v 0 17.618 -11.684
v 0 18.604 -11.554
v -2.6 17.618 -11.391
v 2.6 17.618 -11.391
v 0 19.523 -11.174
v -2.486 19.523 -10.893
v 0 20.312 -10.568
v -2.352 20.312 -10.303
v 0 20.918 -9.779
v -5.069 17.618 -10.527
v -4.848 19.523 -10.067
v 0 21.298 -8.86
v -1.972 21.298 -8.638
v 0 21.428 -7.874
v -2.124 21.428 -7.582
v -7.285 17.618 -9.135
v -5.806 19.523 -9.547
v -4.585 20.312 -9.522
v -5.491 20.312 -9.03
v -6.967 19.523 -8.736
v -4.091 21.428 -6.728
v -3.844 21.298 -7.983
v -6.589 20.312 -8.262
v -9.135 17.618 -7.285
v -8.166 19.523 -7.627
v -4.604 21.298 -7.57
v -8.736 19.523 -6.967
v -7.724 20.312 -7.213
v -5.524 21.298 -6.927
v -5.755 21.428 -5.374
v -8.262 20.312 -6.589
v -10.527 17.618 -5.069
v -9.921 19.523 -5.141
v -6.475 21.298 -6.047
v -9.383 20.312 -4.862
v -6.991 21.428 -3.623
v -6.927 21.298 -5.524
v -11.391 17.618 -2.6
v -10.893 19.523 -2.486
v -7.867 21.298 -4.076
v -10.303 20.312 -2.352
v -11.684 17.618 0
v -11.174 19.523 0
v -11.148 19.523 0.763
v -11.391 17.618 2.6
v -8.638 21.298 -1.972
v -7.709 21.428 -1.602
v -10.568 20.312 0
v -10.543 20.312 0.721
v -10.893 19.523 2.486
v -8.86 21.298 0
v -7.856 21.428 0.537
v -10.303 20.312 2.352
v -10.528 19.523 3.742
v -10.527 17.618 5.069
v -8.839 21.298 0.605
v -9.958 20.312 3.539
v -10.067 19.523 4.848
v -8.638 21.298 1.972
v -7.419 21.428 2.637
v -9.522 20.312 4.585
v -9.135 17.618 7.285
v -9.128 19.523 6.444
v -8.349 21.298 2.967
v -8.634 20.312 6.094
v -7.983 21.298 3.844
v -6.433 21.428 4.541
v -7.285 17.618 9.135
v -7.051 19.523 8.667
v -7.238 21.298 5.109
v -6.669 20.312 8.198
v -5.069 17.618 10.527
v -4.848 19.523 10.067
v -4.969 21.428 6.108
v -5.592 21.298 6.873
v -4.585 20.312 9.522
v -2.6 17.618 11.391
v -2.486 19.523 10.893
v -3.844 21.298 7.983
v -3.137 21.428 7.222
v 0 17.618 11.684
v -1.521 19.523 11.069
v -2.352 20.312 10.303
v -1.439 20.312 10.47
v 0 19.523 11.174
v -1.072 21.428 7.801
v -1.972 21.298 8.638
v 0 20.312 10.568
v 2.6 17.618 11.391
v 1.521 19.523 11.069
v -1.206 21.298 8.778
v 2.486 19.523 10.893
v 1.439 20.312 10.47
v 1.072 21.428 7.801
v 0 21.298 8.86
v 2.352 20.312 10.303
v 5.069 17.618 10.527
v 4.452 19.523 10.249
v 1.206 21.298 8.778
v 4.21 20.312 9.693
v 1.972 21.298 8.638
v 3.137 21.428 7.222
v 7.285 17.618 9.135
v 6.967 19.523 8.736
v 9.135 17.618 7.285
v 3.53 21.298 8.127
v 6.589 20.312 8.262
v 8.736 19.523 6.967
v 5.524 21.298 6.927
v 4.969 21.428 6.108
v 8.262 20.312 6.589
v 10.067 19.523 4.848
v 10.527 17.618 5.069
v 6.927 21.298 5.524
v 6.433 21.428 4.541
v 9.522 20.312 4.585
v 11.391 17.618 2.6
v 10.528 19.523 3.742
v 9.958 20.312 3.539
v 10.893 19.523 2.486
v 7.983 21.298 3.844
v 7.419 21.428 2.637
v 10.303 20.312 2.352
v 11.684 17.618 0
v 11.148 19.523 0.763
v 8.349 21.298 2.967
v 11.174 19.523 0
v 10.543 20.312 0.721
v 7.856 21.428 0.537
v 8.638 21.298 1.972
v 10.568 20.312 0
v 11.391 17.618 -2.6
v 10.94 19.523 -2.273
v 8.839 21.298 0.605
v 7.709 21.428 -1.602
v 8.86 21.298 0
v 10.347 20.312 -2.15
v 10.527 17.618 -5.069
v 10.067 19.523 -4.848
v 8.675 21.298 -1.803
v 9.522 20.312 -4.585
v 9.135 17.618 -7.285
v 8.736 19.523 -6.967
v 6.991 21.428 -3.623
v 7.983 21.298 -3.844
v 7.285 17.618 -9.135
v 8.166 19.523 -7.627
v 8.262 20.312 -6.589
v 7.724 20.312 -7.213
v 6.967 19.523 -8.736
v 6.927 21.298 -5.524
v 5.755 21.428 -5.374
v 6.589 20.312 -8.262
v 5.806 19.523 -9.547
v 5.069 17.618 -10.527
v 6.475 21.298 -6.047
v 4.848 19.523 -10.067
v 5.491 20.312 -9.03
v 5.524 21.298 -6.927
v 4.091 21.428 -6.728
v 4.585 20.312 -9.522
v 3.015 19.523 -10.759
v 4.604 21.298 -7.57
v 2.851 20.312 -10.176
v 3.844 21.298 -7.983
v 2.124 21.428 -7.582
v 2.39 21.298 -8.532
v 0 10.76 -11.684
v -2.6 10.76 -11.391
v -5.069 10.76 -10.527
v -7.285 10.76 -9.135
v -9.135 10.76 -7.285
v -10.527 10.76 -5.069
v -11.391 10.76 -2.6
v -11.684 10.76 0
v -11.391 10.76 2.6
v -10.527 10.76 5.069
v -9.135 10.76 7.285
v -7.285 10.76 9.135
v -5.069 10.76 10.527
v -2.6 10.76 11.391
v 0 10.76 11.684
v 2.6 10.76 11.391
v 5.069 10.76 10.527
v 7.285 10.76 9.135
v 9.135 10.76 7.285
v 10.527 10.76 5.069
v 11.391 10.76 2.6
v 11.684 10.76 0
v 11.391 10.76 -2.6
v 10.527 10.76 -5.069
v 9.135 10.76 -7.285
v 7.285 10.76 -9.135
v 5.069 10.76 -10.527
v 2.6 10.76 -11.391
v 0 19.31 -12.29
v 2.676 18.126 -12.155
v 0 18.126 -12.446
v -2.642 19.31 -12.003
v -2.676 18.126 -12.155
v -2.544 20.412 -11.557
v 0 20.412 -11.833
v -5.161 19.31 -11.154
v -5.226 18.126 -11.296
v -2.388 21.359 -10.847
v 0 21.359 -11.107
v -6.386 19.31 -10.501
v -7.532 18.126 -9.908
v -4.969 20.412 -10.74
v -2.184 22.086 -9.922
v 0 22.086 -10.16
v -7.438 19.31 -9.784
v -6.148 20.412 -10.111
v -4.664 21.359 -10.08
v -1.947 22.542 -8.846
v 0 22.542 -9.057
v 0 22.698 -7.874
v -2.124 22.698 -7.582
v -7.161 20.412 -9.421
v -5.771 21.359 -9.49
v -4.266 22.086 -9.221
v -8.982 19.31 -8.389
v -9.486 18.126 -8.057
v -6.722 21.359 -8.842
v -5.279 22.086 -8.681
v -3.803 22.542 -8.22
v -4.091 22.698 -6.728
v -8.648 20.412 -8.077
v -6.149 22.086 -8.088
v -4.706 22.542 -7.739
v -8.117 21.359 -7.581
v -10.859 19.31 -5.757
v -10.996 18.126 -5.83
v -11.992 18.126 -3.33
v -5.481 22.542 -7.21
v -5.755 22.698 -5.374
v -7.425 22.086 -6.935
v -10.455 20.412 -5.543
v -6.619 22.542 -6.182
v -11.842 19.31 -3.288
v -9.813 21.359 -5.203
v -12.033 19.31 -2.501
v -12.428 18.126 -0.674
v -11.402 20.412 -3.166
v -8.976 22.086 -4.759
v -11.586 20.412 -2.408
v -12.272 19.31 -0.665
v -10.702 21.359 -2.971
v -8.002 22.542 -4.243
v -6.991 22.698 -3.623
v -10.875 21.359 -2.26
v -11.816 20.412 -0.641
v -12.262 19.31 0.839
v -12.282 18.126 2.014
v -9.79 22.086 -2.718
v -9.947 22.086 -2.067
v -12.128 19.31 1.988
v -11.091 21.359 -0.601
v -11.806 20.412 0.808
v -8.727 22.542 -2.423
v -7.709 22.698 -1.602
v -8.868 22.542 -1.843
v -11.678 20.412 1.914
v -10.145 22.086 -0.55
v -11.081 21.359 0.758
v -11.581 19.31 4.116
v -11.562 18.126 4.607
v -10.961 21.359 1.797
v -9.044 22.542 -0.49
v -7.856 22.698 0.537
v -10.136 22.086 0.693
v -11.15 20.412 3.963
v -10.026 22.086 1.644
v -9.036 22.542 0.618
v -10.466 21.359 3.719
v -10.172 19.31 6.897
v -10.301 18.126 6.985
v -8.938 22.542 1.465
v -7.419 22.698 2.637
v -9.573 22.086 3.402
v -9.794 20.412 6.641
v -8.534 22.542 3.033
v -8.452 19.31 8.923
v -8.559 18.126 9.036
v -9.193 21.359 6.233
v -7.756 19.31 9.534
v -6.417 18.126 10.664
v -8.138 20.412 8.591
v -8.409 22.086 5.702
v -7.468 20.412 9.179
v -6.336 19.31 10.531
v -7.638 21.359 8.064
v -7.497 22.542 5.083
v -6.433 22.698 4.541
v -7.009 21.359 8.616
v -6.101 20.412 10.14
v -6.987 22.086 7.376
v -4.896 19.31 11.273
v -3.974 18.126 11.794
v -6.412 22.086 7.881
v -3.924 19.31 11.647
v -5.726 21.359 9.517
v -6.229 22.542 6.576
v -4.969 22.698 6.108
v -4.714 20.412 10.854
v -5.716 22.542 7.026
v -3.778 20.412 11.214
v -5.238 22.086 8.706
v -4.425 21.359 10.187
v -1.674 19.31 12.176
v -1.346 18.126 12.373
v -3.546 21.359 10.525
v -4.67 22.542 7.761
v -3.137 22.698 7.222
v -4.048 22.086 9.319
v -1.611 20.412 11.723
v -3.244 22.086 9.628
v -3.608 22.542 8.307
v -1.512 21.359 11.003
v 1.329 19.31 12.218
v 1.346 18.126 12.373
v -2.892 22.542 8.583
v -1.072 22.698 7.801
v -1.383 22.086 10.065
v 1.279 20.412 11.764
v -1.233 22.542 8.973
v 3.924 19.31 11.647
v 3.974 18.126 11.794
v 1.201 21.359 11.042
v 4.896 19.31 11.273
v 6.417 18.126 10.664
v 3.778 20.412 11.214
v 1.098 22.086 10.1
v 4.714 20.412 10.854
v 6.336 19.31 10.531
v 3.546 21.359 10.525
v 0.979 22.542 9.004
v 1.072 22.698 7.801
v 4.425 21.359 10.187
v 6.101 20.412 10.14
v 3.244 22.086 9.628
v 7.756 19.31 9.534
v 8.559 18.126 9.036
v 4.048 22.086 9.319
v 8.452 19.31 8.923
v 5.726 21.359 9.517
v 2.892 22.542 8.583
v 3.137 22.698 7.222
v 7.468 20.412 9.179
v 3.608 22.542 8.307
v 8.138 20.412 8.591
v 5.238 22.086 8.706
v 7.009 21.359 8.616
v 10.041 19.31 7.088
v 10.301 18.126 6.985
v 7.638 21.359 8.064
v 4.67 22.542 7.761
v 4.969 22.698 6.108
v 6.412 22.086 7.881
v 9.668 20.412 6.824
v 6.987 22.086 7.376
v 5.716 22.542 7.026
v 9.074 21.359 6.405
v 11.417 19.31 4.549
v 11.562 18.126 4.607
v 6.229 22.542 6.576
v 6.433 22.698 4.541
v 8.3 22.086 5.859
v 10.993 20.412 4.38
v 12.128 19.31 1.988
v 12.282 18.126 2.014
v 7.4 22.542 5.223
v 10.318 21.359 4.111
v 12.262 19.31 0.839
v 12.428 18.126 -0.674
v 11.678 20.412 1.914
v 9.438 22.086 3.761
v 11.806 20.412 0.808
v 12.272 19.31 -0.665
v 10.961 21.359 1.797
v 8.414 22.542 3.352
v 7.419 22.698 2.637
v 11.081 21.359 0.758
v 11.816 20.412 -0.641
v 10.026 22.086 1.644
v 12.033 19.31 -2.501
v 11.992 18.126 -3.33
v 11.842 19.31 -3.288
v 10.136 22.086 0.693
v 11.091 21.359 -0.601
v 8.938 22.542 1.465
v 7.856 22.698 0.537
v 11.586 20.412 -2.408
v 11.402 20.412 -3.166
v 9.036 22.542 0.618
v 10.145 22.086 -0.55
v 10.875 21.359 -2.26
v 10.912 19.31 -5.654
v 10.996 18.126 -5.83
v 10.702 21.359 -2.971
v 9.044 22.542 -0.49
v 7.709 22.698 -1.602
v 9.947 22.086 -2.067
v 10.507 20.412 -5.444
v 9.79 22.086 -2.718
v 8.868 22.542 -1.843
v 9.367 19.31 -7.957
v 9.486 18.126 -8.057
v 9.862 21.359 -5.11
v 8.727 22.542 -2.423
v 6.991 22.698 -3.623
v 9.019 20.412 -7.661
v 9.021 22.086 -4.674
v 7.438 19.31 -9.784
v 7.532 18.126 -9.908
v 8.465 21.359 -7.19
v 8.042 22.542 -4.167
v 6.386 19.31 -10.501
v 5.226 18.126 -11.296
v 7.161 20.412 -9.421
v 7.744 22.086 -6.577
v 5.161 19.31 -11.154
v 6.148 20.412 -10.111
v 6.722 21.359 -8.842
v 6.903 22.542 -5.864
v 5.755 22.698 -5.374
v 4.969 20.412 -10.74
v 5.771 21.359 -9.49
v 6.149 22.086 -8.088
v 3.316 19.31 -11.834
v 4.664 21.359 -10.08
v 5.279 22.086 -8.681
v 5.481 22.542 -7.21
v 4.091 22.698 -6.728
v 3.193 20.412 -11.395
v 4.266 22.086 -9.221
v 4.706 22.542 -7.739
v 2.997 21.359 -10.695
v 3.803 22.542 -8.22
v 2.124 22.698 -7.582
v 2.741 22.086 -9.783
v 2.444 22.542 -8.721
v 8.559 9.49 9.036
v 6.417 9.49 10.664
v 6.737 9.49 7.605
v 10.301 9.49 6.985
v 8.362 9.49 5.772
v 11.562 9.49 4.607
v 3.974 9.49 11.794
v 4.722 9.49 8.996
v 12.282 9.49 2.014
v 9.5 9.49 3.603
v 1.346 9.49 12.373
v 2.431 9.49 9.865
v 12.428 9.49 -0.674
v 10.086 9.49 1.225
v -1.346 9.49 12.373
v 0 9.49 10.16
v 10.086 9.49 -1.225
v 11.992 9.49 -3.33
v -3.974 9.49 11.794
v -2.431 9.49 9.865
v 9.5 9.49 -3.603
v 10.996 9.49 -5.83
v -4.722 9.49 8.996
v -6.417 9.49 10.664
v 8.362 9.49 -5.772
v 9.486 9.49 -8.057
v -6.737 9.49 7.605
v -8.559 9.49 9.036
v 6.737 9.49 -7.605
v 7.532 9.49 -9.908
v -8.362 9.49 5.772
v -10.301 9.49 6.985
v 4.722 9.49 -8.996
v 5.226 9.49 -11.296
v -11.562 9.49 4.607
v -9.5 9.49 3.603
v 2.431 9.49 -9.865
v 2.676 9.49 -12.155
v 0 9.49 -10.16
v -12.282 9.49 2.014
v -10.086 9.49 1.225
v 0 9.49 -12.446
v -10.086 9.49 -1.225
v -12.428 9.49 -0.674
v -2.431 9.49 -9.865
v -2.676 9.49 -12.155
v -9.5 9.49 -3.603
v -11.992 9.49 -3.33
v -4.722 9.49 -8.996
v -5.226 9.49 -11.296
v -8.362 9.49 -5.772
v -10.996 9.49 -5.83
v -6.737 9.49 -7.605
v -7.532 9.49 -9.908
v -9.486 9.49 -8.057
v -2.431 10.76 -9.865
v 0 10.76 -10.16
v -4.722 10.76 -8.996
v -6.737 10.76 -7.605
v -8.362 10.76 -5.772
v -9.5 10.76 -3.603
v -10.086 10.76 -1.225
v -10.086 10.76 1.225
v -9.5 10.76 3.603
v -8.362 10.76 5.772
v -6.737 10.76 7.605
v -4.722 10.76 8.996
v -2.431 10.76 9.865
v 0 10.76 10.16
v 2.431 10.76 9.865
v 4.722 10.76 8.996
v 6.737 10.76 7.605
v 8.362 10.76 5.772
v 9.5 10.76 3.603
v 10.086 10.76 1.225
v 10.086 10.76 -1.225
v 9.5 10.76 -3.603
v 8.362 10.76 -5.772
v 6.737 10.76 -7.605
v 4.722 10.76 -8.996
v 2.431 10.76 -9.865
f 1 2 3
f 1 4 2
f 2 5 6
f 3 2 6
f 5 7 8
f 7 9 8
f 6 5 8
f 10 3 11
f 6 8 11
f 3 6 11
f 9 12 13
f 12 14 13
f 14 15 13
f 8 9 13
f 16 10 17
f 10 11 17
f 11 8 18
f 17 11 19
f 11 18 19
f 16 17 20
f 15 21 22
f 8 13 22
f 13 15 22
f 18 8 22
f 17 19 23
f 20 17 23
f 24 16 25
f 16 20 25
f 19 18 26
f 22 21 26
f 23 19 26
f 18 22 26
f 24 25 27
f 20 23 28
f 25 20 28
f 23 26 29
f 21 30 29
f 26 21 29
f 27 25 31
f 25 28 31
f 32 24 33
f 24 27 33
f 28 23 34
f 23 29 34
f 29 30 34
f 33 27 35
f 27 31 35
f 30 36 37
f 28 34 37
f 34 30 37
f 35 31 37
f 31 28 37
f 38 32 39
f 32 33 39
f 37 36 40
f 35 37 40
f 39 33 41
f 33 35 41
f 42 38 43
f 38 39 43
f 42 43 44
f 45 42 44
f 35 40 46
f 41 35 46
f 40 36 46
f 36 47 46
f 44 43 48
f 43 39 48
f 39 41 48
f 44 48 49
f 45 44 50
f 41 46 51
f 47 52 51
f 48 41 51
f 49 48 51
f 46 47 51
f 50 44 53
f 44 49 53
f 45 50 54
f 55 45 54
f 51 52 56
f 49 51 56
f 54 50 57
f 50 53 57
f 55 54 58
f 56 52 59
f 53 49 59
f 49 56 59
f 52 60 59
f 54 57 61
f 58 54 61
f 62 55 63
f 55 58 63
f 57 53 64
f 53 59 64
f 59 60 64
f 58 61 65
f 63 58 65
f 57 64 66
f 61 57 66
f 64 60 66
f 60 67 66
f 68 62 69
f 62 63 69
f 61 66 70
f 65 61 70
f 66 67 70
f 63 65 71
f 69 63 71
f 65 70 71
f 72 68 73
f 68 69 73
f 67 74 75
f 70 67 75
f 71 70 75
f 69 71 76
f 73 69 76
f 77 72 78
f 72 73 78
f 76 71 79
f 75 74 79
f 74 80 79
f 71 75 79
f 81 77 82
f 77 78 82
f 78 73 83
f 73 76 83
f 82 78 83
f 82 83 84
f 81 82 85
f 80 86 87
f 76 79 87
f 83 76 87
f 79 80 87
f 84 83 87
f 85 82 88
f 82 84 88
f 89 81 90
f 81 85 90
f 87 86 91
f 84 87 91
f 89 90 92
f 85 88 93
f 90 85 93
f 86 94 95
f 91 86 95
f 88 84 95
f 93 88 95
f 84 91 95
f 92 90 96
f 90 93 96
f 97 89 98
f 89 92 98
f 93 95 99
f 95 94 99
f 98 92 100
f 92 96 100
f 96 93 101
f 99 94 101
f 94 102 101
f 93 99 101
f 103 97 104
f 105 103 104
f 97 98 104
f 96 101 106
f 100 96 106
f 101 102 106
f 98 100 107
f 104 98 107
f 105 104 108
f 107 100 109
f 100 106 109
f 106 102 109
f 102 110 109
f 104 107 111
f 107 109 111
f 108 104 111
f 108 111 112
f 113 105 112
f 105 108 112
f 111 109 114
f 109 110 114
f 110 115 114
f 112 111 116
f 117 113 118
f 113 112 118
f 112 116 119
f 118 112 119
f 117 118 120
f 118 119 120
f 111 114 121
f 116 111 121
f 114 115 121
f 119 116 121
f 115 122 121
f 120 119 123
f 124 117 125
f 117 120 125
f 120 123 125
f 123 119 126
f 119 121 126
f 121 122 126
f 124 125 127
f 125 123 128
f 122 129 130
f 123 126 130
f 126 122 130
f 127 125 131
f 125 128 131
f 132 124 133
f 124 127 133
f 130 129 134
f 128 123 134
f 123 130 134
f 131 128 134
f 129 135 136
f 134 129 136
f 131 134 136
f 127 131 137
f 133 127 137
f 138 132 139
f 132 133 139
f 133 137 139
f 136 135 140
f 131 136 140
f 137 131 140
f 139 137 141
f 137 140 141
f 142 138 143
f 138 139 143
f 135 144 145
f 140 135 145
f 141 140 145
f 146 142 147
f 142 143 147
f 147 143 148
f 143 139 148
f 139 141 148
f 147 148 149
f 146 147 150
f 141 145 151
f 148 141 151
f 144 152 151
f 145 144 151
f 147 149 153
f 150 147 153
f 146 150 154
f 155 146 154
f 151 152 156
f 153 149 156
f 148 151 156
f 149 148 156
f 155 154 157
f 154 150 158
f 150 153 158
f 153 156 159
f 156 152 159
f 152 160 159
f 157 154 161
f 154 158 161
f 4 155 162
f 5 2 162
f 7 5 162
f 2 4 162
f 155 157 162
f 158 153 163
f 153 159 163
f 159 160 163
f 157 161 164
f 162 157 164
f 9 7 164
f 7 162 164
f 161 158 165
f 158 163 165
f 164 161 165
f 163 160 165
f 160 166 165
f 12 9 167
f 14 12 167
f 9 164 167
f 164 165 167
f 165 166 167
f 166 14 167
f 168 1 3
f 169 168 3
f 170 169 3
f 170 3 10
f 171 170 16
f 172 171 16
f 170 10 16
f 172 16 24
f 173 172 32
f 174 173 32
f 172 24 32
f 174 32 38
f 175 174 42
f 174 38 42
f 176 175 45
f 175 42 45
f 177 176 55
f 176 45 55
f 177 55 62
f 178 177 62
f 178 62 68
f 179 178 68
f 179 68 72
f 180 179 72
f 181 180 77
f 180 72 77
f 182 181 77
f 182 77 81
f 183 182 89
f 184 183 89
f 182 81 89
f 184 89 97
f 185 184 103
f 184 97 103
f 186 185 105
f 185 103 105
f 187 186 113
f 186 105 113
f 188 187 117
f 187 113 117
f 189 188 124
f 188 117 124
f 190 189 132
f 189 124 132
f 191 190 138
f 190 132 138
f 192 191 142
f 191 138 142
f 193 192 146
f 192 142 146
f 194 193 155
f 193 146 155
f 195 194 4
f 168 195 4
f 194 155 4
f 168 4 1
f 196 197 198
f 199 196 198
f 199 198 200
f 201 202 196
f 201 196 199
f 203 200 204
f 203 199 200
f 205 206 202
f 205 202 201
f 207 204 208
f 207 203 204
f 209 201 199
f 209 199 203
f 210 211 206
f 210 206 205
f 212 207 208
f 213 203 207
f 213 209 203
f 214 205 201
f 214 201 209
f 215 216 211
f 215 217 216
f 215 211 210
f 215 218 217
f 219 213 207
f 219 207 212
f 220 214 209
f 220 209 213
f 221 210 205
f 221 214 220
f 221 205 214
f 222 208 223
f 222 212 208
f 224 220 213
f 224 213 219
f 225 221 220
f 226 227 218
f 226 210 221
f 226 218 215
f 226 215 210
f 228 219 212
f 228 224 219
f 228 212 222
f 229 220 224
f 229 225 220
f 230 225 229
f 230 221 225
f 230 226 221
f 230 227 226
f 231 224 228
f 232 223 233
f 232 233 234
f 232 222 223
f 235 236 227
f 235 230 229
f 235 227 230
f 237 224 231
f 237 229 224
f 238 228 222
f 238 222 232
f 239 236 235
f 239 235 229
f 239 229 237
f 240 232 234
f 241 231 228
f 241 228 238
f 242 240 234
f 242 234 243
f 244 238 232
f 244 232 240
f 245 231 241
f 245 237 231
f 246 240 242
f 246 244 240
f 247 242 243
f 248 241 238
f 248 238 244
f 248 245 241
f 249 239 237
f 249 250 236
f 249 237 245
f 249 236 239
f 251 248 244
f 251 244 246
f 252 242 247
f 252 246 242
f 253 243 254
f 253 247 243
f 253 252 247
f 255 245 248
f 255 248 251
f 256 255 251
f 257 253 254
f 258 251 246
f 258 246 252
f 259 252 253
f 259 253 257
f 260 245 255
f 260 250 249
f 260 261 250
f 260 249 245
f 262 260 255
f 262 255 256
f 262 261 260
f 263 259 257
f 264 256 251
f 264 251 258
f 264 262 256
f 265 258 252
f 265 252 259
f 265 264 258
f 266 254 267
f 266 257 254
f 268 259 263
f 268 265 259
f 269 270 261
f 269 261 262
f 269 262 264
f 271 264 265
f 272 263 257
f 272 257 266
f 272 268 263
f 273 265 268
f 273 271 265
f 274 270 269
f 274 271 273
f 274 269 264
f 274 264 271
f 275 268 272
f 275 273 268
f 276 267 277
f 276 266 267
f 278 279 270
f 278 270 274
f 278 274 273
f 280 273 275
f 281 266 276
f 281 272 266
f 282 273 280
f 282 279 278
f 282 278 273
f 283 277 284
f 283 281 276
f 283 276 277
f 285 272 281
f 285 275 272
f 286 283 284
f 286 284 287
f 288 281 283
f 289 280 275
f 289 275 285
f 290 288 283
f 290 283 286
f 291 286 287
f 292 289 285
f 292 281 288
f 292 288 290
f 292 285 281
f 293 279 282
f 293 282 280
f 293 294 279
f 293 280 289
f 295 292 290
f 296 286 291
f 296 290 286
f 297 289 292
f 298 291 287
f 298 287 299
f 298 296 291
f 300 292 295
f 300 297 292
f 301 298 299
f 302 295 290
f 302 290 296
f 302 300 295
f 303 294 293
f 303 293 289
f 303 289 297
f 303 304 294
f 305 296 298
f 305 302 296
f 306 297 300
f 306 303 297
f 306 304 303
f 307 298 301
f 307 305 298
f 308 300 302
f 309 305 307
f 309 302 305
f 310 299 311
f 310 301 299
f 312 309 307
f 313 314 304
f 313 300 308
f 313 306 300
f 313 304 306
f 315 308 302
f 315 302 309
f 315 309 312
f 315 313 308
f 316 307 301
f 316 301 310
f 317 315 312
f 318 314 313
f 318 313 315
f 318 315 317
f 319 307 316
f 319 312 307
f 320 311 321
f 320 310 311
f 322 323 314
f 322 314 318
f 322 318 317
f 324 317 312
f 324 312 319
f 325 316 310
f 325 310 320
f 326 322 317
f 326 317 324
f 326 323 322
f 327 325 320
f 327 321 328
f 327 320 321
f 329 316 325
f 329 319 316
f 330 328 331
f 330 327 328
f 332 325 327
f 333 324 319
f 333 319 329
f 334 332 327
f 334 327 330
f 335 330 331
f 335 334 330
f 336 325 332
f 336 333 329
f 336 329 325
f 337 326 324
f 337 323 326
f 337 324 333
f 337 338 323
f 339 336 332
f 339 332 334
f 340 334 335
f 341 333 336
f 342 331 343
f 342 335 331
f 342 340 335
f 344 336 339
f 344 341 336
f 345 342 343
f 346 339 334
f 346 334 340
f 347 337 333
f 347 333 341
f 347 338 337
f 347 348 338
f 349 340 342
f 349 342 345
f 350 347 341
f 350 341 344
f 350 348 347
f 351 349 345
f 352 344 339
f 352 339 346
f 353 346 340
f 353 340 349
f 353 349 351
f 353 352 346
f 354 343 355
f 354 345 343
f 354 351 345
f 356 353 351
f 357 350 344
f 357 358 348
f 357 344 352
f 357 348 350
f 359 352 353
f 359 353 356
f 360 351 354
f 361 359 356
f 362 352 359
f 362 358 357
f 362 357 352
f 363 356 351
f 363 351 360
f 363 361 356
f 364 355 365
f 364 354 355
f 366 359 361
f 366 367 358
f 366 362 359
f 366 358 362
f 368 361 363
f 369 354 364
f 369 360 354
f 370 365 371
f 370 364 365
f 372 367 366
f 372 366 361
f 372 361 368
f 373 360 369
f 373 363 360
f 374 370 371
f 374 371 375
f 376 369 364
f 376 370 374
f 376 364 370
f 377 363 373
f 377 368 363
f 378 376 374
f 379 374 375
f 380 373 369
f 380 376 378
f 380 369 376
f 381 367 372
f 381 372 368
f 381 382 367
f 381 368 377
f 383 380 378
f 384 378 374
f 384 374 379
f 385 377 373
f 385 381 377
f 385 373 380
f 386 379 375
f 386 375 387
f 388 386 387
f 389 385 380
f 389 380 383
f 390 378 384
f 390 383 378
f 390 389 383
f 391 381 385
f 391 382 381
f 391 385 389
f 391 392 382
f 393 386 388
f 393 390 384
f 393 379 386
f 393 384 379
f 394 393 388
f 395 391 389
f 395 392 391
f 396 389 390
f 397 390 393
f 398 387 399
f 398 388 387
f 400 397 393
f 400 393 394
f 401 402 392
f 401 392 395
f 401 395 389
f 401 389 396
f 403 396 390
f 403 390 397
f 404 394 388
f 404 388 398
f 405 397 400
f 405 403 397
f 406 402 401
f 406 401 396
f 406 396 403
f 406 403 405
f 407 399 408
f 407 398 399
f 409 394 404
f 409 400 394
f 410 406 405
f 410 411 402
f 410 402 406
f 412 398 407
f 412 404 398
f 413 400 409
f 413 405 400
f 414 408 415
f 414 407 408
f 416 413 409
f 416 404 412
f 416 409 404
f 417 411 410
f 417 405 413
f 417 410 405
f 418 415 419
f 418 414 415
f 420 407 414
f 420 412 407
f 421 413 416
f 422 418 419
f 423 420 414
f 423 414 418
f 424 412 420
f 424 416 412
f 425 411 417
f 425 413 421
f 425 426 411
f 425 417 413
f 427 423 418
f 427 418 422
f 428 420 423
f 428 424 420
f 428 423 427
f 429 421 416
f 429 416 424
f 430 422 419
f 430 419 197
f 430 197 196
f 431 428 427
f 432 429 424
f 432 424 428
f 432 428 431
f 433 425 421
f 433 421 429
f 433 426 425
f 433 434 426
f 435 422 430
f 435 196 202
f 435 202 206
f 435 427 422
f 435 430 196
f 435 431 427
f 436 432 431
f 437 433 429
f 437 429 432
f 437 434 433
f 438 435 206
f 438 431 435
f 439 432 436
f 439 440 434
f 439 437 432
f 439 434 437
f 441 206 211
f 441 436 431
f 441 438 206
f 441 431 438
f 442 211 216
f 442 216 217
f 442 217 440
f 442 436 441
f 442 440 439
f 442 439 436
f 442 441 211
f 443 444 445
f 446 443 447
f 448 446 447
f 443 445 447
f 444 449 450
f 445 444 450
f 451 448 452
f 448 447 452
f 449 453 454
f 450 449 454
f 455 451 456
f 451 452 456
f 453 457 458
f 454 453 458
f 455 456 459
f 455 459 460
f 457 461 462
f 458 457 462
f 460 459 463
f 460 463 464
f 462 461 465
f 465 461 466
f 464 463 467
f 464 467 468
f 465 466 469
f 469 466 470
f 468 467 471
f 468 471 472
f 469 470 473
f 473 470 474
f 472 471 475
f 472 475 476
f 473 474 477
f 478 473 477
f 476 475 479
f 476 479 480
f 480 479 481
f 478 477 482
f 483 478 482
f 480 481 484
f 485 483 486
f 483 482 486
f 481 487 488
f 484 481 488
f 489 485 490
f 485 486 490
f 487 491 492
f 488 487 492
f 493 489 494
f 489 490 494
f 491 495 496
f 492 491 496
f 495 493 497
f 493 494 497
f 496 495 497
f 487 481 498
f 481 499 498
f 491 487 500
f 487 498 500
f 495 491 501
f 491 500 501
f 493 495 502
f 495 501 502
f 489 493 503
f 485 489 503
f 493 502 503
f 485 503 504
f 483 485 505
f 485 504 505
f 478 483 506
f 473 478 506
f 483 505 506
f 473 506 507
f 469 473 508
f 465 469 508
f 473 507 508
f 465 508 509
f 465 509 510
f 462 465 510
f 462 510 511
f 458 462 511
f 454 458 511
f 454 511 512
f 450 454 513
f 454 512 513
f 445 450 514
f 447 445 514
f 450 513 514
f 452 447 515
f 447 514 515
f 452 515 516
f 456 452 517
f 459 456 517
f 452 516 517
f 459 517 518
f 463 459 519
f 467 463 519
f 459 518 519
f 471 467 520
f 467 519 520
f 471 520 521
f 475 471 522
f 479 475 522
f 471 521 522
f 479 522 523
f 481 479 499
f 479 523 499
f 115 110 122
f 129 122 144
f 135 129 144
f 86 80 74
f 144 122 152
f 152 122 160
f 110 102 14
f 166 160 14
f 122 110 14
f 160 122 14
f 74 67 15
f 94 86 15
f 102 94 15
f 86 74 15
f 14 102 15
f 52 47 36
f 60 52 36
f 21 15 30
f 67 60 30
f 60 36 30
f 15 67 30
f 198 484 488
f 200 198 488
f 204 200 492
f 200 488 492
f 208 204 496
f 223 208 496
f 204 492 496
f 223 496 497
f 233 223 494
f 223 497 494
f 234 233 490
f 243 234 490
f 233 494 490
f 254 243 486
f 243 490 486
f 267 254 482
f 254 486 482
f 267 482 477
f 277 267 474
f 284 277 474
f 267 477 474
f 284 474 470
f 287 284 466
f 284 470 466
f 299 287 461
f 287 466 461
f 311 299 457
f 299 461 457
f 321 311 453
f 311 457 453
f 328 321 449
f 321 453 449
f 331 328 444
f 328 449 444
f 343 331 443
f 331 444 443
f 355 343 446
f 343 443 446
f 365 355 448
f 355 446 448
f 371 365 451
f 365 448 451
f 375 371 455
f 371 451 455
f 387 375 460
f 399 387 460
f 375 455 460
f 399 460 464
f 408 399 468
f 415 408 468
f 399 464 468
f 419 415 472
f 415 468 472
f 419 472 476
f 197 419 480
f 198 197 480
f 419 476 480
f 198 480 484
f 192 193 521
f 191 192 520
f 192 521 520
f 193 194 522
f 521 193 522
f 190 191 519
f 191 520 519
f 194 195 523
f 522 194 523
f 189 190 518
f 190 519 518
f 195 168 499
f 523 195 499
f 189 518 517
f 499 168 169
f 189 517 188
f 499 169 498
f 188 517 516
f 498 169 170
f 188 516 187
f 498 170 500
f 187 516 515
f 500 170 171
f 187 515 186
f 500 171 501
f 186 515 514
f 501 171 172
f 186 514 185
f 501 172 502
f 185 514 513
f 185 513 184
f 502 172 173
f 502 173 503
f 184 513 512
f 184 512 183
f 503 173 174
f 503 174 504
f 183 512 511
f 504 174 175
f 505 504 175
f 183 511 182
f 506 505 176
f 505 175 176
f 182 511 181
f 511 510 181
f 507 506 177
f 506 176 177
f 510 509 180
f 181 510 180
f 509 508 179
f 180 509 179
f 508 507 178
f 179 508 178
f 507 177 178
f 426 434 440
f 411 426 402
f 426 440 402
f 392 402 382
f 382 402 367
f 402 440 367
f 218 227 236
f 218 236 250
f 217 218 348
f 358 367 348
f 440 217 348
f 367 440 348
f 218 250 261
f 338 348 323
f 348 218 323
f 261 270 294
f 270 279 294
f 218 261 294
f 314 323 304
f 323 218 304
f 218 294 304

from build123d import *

# Parameters (mm, degrees)
FILLET1_R = 3.81
FILLET2_R = 4.572


with BuildPart() as part:
    # Sketch1 → Base-Revolve (revolve)
    with BuildSketch(Plane.XY, mode=Mode.PRIVATE) as base_revolve_sk:
        Polygon((0, 22.698261335), (12.446, 22.698261335), (12.446, 9.490261335), (10.16, 9.490261335), (10.16, 10.760261335), (11.684, 10.760261335), (11.684, 21.428261335), (0, 21.428261335), align=None)
    revolve(base_revolve_sk.sketch.rotate(Axis((0, 0, 0), (0, 1, 0)), 90), axis=Axis((0, 0, 0), (0, 1, 0)))

    # Fillet1
    fillet1_edges = [part.edges().sort_by_distance(p)[0] for p in [
        (0, 21.428261335, 11.684),
    ]]
    fillet(fillet1_edges, radius=FILLET1_R)

    # Fillet2
    fillet2_edges = [part.edges().sort_by_distance(p)[0] for p in [
        (0, 22.698261335, 12.446),
    ]]
    fillet(fillet2_edges, radius=FILLET2_R)


solid = part.part
